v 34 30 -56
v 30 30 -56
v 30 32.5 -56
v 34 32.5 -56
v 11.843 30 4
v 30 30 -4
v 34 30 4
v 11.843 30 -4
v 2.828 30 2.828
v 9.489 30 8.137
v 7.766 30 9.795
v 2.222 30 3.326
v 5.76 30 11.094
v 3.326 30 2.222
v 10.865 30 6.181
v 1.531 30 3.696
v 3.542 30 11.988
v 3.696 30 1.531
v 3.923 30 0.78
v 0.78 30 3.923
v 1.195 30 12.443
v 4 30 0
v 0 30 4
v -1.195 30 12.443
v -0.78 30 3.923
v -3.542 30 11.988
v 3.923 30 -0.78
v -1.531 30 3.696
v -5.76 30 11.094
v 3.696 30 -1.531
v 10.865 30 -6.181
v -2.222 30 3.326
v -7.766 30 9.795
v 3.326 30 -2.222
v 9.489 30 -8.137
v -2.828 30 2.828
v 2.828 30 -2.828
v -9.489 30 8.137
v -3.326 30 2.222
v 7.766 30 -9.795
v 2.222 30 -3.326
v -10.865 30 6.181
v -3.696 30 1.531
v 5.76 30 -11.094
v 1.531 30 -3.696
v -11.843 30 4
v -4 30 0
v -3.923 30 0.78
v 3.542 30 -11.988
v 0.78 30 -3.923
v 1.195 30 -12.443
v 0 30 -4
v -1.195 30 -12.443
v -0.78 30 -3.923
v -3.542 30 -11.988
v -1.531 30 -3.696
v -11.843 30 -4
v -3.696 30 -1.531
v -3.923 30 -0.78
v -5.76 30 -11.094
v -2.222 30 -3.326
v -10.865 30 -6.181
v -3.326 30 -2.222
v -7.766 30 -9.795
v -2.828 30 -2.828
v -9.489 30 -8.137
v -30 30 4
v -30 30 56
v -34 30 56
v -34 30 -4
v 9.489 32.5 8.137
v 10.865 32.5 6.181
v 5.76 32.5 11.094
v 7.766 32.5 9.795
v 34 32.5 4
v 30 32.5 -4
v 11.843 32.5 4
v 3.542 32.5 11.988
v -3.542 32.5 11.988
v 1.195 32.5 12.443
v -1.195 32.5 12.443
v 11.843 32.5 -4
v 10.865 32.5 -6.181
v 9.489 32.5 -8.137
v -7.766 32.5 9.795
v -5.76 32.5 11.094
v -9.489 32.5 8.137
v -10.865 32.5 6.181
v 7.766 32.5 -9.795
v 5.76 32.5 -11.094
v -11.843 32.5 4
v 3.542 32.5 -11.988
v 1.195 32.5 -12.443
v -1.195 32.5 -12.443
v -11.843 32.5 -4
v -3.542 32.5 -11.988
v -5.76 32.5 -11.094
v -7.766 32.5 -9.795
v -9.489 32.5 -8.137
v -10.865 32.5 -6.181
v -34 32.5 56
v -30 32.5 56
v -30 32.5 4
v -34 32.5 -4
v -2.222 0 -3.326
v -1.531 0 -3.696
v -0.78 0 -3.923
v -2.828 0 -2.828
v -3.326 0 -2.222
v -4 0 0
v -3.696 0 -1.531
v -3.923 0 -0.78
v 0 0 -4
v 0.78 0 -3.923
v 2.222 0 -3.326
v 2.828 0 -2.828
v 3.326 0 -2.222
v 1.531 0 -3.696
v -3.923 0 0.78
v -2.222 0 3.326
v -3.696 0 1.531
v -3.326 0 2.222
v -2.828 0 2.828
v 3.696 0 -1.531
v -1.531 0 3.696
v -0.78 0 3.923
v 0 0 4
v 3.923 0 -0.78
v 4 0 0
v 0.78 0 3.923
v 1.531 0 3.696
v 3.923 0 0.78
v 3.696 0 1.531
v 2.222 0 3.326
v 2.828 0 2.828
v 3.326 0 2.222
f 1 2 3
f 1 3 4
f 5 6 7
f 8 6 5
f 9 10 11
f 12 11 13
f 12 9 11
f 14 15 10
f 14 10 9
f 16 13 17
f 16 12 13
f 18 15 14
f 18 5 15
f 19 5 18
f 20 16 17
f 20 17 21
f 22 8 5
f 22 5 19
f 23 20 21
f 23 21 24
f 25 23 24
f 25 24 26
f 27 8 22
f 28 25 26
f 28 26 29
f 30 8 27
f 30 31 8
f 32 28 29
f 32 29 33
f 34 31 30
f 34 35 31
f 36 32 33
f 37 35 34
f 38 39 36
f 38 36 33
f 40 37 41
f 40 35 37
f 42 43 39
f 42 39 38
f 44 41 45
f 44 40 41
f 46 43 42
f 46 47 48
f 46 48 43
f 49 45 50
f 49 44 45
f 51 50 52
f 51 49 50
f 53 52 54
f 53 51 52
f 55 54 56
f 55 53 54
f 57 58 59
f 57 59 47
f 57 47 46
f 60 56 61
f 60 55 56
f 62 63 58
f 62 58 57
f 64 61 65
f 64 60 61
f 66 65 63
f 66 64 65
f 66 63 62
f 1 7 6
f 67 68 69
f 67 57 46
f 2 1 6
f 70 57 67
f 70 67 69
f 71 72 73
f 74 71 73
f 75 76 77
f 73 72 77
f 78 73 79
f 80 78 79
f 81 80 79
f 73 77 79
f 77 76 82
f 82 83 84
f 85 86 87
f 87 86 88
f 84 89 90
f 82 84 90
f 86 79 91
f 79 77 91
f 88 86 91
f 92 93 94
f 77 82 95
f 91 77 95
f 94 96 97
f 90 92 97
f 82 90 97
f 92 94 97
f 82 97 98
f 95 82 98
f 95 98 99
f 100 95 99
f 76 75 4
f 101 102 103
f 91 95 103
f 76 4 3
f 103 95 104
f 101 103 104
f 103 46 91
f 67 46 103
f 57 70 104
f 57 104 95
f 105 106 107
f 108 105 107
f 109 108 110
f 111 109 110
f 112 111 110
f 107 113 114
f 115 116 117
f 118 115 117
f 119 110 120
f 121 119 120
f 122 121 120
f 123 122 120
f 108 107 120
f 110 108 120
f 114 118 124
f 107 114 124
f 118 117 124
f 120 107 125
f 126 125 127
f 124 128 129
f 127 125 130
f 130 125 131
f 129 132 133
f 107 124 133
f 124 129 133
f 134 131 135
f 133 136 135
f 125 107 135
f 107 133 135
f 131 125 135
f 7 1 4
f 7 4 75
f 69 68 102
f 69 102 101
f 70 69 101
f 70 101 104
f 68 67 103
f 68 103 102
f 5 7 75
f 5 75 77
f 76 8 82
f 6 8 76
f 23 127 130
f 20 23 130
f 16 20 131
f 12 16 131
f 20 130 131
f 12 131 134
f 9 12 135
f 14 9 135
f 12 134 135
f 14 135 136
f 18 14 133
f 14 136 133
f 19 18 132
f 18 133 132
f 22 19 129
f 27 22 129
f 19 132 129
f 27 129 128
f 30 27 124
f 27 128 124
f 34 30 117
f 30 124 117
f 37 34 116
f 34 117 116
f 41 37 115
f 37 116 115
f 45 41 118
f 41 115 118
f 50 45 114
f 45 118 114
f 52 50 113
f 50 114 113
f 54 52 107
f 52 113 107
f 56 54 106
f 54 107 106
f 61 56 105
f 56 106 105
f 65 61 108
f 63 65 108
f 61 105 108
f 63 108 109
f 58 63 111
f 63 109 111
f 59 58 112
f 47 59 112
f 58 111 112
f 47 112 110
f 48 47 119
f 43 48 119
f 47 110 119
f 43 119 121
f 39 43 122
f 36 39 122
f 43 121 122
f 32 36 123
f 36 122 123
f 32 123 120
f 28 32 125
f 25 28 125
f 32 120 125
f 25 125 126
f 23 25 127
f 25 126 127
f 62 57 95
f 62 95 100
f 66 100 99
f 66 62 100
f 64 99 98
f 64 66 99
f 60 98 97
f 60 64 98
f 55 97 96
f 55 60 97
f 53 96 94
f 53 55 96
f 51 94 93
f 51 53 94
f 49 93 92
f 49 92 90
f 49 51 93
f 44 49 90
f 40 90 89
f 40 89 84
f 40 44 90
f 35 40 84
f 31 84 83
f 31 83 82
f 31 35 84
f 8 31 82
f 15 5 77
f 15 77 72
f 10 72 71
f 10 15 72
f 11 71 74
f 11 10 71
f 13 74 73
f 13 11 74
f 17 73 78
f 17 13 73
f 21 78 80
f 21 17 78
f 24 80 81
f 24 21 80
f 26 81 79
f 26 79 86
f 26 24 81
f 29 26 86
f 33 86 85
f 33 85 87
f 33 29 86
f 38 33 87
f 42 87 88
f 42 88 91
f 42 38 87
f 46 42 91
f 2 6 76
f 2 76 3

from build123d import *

# Parameters (mm, degrees)
SKETCH_1_R      = 4
EXTRUDE_1_DEPTH = 30
EXTRUDE_2_DEPTH = 2.5


with BuildPart() as part:
    # Эскиз1 → Бобышка-Вытянуть1 (new body)
    with BuildSketch(Plane(origin=(0, 0, 0), x_dir=(1, 0, 0), z_dir=(0, 1, 0))):
        with Locations(Location((0, 0, 0), (0, 0, 270))):
            Circle(SKETCH_1_R)
    extrude(amount=EXTRUDE_1_DEPTH)

    # Эскиз2 → Бобышка-Вытянуть2 (add)
    with BuildSketch(Plane(origin=(0, 30, 0), x_dir=(1, 0, 0), z_dir=(0, 1, 0))):
        with BuildLine():
            Line((30, 4), (30, 56))
            Line((30, 56), (34, 56))
            Line((34, 56), (34, -4))
            Line((34, -4), (11.842719282, -4))
            ThreePointArc((11.842719282, -4), (0, -12.5), (-11.842719282, -4))
            Line((-11.842719282, -4), (-30, -4))
            Line((-30, -4), (-30, -56))
            Line((-30, -56), (-34, -56))
            Line((-34, -56), (-34, 4))
            Line((-34, 4), (-11.842719282, 4))
            ThreePointArc((-11.842719282, 4), (0, 12.5), (11.842719282, 4))
            Line((11.842719282, 4), (30, 4))
        make_face()
    extrude(amount=EXTRUDE_2_DEPTH)


solid = part.part
